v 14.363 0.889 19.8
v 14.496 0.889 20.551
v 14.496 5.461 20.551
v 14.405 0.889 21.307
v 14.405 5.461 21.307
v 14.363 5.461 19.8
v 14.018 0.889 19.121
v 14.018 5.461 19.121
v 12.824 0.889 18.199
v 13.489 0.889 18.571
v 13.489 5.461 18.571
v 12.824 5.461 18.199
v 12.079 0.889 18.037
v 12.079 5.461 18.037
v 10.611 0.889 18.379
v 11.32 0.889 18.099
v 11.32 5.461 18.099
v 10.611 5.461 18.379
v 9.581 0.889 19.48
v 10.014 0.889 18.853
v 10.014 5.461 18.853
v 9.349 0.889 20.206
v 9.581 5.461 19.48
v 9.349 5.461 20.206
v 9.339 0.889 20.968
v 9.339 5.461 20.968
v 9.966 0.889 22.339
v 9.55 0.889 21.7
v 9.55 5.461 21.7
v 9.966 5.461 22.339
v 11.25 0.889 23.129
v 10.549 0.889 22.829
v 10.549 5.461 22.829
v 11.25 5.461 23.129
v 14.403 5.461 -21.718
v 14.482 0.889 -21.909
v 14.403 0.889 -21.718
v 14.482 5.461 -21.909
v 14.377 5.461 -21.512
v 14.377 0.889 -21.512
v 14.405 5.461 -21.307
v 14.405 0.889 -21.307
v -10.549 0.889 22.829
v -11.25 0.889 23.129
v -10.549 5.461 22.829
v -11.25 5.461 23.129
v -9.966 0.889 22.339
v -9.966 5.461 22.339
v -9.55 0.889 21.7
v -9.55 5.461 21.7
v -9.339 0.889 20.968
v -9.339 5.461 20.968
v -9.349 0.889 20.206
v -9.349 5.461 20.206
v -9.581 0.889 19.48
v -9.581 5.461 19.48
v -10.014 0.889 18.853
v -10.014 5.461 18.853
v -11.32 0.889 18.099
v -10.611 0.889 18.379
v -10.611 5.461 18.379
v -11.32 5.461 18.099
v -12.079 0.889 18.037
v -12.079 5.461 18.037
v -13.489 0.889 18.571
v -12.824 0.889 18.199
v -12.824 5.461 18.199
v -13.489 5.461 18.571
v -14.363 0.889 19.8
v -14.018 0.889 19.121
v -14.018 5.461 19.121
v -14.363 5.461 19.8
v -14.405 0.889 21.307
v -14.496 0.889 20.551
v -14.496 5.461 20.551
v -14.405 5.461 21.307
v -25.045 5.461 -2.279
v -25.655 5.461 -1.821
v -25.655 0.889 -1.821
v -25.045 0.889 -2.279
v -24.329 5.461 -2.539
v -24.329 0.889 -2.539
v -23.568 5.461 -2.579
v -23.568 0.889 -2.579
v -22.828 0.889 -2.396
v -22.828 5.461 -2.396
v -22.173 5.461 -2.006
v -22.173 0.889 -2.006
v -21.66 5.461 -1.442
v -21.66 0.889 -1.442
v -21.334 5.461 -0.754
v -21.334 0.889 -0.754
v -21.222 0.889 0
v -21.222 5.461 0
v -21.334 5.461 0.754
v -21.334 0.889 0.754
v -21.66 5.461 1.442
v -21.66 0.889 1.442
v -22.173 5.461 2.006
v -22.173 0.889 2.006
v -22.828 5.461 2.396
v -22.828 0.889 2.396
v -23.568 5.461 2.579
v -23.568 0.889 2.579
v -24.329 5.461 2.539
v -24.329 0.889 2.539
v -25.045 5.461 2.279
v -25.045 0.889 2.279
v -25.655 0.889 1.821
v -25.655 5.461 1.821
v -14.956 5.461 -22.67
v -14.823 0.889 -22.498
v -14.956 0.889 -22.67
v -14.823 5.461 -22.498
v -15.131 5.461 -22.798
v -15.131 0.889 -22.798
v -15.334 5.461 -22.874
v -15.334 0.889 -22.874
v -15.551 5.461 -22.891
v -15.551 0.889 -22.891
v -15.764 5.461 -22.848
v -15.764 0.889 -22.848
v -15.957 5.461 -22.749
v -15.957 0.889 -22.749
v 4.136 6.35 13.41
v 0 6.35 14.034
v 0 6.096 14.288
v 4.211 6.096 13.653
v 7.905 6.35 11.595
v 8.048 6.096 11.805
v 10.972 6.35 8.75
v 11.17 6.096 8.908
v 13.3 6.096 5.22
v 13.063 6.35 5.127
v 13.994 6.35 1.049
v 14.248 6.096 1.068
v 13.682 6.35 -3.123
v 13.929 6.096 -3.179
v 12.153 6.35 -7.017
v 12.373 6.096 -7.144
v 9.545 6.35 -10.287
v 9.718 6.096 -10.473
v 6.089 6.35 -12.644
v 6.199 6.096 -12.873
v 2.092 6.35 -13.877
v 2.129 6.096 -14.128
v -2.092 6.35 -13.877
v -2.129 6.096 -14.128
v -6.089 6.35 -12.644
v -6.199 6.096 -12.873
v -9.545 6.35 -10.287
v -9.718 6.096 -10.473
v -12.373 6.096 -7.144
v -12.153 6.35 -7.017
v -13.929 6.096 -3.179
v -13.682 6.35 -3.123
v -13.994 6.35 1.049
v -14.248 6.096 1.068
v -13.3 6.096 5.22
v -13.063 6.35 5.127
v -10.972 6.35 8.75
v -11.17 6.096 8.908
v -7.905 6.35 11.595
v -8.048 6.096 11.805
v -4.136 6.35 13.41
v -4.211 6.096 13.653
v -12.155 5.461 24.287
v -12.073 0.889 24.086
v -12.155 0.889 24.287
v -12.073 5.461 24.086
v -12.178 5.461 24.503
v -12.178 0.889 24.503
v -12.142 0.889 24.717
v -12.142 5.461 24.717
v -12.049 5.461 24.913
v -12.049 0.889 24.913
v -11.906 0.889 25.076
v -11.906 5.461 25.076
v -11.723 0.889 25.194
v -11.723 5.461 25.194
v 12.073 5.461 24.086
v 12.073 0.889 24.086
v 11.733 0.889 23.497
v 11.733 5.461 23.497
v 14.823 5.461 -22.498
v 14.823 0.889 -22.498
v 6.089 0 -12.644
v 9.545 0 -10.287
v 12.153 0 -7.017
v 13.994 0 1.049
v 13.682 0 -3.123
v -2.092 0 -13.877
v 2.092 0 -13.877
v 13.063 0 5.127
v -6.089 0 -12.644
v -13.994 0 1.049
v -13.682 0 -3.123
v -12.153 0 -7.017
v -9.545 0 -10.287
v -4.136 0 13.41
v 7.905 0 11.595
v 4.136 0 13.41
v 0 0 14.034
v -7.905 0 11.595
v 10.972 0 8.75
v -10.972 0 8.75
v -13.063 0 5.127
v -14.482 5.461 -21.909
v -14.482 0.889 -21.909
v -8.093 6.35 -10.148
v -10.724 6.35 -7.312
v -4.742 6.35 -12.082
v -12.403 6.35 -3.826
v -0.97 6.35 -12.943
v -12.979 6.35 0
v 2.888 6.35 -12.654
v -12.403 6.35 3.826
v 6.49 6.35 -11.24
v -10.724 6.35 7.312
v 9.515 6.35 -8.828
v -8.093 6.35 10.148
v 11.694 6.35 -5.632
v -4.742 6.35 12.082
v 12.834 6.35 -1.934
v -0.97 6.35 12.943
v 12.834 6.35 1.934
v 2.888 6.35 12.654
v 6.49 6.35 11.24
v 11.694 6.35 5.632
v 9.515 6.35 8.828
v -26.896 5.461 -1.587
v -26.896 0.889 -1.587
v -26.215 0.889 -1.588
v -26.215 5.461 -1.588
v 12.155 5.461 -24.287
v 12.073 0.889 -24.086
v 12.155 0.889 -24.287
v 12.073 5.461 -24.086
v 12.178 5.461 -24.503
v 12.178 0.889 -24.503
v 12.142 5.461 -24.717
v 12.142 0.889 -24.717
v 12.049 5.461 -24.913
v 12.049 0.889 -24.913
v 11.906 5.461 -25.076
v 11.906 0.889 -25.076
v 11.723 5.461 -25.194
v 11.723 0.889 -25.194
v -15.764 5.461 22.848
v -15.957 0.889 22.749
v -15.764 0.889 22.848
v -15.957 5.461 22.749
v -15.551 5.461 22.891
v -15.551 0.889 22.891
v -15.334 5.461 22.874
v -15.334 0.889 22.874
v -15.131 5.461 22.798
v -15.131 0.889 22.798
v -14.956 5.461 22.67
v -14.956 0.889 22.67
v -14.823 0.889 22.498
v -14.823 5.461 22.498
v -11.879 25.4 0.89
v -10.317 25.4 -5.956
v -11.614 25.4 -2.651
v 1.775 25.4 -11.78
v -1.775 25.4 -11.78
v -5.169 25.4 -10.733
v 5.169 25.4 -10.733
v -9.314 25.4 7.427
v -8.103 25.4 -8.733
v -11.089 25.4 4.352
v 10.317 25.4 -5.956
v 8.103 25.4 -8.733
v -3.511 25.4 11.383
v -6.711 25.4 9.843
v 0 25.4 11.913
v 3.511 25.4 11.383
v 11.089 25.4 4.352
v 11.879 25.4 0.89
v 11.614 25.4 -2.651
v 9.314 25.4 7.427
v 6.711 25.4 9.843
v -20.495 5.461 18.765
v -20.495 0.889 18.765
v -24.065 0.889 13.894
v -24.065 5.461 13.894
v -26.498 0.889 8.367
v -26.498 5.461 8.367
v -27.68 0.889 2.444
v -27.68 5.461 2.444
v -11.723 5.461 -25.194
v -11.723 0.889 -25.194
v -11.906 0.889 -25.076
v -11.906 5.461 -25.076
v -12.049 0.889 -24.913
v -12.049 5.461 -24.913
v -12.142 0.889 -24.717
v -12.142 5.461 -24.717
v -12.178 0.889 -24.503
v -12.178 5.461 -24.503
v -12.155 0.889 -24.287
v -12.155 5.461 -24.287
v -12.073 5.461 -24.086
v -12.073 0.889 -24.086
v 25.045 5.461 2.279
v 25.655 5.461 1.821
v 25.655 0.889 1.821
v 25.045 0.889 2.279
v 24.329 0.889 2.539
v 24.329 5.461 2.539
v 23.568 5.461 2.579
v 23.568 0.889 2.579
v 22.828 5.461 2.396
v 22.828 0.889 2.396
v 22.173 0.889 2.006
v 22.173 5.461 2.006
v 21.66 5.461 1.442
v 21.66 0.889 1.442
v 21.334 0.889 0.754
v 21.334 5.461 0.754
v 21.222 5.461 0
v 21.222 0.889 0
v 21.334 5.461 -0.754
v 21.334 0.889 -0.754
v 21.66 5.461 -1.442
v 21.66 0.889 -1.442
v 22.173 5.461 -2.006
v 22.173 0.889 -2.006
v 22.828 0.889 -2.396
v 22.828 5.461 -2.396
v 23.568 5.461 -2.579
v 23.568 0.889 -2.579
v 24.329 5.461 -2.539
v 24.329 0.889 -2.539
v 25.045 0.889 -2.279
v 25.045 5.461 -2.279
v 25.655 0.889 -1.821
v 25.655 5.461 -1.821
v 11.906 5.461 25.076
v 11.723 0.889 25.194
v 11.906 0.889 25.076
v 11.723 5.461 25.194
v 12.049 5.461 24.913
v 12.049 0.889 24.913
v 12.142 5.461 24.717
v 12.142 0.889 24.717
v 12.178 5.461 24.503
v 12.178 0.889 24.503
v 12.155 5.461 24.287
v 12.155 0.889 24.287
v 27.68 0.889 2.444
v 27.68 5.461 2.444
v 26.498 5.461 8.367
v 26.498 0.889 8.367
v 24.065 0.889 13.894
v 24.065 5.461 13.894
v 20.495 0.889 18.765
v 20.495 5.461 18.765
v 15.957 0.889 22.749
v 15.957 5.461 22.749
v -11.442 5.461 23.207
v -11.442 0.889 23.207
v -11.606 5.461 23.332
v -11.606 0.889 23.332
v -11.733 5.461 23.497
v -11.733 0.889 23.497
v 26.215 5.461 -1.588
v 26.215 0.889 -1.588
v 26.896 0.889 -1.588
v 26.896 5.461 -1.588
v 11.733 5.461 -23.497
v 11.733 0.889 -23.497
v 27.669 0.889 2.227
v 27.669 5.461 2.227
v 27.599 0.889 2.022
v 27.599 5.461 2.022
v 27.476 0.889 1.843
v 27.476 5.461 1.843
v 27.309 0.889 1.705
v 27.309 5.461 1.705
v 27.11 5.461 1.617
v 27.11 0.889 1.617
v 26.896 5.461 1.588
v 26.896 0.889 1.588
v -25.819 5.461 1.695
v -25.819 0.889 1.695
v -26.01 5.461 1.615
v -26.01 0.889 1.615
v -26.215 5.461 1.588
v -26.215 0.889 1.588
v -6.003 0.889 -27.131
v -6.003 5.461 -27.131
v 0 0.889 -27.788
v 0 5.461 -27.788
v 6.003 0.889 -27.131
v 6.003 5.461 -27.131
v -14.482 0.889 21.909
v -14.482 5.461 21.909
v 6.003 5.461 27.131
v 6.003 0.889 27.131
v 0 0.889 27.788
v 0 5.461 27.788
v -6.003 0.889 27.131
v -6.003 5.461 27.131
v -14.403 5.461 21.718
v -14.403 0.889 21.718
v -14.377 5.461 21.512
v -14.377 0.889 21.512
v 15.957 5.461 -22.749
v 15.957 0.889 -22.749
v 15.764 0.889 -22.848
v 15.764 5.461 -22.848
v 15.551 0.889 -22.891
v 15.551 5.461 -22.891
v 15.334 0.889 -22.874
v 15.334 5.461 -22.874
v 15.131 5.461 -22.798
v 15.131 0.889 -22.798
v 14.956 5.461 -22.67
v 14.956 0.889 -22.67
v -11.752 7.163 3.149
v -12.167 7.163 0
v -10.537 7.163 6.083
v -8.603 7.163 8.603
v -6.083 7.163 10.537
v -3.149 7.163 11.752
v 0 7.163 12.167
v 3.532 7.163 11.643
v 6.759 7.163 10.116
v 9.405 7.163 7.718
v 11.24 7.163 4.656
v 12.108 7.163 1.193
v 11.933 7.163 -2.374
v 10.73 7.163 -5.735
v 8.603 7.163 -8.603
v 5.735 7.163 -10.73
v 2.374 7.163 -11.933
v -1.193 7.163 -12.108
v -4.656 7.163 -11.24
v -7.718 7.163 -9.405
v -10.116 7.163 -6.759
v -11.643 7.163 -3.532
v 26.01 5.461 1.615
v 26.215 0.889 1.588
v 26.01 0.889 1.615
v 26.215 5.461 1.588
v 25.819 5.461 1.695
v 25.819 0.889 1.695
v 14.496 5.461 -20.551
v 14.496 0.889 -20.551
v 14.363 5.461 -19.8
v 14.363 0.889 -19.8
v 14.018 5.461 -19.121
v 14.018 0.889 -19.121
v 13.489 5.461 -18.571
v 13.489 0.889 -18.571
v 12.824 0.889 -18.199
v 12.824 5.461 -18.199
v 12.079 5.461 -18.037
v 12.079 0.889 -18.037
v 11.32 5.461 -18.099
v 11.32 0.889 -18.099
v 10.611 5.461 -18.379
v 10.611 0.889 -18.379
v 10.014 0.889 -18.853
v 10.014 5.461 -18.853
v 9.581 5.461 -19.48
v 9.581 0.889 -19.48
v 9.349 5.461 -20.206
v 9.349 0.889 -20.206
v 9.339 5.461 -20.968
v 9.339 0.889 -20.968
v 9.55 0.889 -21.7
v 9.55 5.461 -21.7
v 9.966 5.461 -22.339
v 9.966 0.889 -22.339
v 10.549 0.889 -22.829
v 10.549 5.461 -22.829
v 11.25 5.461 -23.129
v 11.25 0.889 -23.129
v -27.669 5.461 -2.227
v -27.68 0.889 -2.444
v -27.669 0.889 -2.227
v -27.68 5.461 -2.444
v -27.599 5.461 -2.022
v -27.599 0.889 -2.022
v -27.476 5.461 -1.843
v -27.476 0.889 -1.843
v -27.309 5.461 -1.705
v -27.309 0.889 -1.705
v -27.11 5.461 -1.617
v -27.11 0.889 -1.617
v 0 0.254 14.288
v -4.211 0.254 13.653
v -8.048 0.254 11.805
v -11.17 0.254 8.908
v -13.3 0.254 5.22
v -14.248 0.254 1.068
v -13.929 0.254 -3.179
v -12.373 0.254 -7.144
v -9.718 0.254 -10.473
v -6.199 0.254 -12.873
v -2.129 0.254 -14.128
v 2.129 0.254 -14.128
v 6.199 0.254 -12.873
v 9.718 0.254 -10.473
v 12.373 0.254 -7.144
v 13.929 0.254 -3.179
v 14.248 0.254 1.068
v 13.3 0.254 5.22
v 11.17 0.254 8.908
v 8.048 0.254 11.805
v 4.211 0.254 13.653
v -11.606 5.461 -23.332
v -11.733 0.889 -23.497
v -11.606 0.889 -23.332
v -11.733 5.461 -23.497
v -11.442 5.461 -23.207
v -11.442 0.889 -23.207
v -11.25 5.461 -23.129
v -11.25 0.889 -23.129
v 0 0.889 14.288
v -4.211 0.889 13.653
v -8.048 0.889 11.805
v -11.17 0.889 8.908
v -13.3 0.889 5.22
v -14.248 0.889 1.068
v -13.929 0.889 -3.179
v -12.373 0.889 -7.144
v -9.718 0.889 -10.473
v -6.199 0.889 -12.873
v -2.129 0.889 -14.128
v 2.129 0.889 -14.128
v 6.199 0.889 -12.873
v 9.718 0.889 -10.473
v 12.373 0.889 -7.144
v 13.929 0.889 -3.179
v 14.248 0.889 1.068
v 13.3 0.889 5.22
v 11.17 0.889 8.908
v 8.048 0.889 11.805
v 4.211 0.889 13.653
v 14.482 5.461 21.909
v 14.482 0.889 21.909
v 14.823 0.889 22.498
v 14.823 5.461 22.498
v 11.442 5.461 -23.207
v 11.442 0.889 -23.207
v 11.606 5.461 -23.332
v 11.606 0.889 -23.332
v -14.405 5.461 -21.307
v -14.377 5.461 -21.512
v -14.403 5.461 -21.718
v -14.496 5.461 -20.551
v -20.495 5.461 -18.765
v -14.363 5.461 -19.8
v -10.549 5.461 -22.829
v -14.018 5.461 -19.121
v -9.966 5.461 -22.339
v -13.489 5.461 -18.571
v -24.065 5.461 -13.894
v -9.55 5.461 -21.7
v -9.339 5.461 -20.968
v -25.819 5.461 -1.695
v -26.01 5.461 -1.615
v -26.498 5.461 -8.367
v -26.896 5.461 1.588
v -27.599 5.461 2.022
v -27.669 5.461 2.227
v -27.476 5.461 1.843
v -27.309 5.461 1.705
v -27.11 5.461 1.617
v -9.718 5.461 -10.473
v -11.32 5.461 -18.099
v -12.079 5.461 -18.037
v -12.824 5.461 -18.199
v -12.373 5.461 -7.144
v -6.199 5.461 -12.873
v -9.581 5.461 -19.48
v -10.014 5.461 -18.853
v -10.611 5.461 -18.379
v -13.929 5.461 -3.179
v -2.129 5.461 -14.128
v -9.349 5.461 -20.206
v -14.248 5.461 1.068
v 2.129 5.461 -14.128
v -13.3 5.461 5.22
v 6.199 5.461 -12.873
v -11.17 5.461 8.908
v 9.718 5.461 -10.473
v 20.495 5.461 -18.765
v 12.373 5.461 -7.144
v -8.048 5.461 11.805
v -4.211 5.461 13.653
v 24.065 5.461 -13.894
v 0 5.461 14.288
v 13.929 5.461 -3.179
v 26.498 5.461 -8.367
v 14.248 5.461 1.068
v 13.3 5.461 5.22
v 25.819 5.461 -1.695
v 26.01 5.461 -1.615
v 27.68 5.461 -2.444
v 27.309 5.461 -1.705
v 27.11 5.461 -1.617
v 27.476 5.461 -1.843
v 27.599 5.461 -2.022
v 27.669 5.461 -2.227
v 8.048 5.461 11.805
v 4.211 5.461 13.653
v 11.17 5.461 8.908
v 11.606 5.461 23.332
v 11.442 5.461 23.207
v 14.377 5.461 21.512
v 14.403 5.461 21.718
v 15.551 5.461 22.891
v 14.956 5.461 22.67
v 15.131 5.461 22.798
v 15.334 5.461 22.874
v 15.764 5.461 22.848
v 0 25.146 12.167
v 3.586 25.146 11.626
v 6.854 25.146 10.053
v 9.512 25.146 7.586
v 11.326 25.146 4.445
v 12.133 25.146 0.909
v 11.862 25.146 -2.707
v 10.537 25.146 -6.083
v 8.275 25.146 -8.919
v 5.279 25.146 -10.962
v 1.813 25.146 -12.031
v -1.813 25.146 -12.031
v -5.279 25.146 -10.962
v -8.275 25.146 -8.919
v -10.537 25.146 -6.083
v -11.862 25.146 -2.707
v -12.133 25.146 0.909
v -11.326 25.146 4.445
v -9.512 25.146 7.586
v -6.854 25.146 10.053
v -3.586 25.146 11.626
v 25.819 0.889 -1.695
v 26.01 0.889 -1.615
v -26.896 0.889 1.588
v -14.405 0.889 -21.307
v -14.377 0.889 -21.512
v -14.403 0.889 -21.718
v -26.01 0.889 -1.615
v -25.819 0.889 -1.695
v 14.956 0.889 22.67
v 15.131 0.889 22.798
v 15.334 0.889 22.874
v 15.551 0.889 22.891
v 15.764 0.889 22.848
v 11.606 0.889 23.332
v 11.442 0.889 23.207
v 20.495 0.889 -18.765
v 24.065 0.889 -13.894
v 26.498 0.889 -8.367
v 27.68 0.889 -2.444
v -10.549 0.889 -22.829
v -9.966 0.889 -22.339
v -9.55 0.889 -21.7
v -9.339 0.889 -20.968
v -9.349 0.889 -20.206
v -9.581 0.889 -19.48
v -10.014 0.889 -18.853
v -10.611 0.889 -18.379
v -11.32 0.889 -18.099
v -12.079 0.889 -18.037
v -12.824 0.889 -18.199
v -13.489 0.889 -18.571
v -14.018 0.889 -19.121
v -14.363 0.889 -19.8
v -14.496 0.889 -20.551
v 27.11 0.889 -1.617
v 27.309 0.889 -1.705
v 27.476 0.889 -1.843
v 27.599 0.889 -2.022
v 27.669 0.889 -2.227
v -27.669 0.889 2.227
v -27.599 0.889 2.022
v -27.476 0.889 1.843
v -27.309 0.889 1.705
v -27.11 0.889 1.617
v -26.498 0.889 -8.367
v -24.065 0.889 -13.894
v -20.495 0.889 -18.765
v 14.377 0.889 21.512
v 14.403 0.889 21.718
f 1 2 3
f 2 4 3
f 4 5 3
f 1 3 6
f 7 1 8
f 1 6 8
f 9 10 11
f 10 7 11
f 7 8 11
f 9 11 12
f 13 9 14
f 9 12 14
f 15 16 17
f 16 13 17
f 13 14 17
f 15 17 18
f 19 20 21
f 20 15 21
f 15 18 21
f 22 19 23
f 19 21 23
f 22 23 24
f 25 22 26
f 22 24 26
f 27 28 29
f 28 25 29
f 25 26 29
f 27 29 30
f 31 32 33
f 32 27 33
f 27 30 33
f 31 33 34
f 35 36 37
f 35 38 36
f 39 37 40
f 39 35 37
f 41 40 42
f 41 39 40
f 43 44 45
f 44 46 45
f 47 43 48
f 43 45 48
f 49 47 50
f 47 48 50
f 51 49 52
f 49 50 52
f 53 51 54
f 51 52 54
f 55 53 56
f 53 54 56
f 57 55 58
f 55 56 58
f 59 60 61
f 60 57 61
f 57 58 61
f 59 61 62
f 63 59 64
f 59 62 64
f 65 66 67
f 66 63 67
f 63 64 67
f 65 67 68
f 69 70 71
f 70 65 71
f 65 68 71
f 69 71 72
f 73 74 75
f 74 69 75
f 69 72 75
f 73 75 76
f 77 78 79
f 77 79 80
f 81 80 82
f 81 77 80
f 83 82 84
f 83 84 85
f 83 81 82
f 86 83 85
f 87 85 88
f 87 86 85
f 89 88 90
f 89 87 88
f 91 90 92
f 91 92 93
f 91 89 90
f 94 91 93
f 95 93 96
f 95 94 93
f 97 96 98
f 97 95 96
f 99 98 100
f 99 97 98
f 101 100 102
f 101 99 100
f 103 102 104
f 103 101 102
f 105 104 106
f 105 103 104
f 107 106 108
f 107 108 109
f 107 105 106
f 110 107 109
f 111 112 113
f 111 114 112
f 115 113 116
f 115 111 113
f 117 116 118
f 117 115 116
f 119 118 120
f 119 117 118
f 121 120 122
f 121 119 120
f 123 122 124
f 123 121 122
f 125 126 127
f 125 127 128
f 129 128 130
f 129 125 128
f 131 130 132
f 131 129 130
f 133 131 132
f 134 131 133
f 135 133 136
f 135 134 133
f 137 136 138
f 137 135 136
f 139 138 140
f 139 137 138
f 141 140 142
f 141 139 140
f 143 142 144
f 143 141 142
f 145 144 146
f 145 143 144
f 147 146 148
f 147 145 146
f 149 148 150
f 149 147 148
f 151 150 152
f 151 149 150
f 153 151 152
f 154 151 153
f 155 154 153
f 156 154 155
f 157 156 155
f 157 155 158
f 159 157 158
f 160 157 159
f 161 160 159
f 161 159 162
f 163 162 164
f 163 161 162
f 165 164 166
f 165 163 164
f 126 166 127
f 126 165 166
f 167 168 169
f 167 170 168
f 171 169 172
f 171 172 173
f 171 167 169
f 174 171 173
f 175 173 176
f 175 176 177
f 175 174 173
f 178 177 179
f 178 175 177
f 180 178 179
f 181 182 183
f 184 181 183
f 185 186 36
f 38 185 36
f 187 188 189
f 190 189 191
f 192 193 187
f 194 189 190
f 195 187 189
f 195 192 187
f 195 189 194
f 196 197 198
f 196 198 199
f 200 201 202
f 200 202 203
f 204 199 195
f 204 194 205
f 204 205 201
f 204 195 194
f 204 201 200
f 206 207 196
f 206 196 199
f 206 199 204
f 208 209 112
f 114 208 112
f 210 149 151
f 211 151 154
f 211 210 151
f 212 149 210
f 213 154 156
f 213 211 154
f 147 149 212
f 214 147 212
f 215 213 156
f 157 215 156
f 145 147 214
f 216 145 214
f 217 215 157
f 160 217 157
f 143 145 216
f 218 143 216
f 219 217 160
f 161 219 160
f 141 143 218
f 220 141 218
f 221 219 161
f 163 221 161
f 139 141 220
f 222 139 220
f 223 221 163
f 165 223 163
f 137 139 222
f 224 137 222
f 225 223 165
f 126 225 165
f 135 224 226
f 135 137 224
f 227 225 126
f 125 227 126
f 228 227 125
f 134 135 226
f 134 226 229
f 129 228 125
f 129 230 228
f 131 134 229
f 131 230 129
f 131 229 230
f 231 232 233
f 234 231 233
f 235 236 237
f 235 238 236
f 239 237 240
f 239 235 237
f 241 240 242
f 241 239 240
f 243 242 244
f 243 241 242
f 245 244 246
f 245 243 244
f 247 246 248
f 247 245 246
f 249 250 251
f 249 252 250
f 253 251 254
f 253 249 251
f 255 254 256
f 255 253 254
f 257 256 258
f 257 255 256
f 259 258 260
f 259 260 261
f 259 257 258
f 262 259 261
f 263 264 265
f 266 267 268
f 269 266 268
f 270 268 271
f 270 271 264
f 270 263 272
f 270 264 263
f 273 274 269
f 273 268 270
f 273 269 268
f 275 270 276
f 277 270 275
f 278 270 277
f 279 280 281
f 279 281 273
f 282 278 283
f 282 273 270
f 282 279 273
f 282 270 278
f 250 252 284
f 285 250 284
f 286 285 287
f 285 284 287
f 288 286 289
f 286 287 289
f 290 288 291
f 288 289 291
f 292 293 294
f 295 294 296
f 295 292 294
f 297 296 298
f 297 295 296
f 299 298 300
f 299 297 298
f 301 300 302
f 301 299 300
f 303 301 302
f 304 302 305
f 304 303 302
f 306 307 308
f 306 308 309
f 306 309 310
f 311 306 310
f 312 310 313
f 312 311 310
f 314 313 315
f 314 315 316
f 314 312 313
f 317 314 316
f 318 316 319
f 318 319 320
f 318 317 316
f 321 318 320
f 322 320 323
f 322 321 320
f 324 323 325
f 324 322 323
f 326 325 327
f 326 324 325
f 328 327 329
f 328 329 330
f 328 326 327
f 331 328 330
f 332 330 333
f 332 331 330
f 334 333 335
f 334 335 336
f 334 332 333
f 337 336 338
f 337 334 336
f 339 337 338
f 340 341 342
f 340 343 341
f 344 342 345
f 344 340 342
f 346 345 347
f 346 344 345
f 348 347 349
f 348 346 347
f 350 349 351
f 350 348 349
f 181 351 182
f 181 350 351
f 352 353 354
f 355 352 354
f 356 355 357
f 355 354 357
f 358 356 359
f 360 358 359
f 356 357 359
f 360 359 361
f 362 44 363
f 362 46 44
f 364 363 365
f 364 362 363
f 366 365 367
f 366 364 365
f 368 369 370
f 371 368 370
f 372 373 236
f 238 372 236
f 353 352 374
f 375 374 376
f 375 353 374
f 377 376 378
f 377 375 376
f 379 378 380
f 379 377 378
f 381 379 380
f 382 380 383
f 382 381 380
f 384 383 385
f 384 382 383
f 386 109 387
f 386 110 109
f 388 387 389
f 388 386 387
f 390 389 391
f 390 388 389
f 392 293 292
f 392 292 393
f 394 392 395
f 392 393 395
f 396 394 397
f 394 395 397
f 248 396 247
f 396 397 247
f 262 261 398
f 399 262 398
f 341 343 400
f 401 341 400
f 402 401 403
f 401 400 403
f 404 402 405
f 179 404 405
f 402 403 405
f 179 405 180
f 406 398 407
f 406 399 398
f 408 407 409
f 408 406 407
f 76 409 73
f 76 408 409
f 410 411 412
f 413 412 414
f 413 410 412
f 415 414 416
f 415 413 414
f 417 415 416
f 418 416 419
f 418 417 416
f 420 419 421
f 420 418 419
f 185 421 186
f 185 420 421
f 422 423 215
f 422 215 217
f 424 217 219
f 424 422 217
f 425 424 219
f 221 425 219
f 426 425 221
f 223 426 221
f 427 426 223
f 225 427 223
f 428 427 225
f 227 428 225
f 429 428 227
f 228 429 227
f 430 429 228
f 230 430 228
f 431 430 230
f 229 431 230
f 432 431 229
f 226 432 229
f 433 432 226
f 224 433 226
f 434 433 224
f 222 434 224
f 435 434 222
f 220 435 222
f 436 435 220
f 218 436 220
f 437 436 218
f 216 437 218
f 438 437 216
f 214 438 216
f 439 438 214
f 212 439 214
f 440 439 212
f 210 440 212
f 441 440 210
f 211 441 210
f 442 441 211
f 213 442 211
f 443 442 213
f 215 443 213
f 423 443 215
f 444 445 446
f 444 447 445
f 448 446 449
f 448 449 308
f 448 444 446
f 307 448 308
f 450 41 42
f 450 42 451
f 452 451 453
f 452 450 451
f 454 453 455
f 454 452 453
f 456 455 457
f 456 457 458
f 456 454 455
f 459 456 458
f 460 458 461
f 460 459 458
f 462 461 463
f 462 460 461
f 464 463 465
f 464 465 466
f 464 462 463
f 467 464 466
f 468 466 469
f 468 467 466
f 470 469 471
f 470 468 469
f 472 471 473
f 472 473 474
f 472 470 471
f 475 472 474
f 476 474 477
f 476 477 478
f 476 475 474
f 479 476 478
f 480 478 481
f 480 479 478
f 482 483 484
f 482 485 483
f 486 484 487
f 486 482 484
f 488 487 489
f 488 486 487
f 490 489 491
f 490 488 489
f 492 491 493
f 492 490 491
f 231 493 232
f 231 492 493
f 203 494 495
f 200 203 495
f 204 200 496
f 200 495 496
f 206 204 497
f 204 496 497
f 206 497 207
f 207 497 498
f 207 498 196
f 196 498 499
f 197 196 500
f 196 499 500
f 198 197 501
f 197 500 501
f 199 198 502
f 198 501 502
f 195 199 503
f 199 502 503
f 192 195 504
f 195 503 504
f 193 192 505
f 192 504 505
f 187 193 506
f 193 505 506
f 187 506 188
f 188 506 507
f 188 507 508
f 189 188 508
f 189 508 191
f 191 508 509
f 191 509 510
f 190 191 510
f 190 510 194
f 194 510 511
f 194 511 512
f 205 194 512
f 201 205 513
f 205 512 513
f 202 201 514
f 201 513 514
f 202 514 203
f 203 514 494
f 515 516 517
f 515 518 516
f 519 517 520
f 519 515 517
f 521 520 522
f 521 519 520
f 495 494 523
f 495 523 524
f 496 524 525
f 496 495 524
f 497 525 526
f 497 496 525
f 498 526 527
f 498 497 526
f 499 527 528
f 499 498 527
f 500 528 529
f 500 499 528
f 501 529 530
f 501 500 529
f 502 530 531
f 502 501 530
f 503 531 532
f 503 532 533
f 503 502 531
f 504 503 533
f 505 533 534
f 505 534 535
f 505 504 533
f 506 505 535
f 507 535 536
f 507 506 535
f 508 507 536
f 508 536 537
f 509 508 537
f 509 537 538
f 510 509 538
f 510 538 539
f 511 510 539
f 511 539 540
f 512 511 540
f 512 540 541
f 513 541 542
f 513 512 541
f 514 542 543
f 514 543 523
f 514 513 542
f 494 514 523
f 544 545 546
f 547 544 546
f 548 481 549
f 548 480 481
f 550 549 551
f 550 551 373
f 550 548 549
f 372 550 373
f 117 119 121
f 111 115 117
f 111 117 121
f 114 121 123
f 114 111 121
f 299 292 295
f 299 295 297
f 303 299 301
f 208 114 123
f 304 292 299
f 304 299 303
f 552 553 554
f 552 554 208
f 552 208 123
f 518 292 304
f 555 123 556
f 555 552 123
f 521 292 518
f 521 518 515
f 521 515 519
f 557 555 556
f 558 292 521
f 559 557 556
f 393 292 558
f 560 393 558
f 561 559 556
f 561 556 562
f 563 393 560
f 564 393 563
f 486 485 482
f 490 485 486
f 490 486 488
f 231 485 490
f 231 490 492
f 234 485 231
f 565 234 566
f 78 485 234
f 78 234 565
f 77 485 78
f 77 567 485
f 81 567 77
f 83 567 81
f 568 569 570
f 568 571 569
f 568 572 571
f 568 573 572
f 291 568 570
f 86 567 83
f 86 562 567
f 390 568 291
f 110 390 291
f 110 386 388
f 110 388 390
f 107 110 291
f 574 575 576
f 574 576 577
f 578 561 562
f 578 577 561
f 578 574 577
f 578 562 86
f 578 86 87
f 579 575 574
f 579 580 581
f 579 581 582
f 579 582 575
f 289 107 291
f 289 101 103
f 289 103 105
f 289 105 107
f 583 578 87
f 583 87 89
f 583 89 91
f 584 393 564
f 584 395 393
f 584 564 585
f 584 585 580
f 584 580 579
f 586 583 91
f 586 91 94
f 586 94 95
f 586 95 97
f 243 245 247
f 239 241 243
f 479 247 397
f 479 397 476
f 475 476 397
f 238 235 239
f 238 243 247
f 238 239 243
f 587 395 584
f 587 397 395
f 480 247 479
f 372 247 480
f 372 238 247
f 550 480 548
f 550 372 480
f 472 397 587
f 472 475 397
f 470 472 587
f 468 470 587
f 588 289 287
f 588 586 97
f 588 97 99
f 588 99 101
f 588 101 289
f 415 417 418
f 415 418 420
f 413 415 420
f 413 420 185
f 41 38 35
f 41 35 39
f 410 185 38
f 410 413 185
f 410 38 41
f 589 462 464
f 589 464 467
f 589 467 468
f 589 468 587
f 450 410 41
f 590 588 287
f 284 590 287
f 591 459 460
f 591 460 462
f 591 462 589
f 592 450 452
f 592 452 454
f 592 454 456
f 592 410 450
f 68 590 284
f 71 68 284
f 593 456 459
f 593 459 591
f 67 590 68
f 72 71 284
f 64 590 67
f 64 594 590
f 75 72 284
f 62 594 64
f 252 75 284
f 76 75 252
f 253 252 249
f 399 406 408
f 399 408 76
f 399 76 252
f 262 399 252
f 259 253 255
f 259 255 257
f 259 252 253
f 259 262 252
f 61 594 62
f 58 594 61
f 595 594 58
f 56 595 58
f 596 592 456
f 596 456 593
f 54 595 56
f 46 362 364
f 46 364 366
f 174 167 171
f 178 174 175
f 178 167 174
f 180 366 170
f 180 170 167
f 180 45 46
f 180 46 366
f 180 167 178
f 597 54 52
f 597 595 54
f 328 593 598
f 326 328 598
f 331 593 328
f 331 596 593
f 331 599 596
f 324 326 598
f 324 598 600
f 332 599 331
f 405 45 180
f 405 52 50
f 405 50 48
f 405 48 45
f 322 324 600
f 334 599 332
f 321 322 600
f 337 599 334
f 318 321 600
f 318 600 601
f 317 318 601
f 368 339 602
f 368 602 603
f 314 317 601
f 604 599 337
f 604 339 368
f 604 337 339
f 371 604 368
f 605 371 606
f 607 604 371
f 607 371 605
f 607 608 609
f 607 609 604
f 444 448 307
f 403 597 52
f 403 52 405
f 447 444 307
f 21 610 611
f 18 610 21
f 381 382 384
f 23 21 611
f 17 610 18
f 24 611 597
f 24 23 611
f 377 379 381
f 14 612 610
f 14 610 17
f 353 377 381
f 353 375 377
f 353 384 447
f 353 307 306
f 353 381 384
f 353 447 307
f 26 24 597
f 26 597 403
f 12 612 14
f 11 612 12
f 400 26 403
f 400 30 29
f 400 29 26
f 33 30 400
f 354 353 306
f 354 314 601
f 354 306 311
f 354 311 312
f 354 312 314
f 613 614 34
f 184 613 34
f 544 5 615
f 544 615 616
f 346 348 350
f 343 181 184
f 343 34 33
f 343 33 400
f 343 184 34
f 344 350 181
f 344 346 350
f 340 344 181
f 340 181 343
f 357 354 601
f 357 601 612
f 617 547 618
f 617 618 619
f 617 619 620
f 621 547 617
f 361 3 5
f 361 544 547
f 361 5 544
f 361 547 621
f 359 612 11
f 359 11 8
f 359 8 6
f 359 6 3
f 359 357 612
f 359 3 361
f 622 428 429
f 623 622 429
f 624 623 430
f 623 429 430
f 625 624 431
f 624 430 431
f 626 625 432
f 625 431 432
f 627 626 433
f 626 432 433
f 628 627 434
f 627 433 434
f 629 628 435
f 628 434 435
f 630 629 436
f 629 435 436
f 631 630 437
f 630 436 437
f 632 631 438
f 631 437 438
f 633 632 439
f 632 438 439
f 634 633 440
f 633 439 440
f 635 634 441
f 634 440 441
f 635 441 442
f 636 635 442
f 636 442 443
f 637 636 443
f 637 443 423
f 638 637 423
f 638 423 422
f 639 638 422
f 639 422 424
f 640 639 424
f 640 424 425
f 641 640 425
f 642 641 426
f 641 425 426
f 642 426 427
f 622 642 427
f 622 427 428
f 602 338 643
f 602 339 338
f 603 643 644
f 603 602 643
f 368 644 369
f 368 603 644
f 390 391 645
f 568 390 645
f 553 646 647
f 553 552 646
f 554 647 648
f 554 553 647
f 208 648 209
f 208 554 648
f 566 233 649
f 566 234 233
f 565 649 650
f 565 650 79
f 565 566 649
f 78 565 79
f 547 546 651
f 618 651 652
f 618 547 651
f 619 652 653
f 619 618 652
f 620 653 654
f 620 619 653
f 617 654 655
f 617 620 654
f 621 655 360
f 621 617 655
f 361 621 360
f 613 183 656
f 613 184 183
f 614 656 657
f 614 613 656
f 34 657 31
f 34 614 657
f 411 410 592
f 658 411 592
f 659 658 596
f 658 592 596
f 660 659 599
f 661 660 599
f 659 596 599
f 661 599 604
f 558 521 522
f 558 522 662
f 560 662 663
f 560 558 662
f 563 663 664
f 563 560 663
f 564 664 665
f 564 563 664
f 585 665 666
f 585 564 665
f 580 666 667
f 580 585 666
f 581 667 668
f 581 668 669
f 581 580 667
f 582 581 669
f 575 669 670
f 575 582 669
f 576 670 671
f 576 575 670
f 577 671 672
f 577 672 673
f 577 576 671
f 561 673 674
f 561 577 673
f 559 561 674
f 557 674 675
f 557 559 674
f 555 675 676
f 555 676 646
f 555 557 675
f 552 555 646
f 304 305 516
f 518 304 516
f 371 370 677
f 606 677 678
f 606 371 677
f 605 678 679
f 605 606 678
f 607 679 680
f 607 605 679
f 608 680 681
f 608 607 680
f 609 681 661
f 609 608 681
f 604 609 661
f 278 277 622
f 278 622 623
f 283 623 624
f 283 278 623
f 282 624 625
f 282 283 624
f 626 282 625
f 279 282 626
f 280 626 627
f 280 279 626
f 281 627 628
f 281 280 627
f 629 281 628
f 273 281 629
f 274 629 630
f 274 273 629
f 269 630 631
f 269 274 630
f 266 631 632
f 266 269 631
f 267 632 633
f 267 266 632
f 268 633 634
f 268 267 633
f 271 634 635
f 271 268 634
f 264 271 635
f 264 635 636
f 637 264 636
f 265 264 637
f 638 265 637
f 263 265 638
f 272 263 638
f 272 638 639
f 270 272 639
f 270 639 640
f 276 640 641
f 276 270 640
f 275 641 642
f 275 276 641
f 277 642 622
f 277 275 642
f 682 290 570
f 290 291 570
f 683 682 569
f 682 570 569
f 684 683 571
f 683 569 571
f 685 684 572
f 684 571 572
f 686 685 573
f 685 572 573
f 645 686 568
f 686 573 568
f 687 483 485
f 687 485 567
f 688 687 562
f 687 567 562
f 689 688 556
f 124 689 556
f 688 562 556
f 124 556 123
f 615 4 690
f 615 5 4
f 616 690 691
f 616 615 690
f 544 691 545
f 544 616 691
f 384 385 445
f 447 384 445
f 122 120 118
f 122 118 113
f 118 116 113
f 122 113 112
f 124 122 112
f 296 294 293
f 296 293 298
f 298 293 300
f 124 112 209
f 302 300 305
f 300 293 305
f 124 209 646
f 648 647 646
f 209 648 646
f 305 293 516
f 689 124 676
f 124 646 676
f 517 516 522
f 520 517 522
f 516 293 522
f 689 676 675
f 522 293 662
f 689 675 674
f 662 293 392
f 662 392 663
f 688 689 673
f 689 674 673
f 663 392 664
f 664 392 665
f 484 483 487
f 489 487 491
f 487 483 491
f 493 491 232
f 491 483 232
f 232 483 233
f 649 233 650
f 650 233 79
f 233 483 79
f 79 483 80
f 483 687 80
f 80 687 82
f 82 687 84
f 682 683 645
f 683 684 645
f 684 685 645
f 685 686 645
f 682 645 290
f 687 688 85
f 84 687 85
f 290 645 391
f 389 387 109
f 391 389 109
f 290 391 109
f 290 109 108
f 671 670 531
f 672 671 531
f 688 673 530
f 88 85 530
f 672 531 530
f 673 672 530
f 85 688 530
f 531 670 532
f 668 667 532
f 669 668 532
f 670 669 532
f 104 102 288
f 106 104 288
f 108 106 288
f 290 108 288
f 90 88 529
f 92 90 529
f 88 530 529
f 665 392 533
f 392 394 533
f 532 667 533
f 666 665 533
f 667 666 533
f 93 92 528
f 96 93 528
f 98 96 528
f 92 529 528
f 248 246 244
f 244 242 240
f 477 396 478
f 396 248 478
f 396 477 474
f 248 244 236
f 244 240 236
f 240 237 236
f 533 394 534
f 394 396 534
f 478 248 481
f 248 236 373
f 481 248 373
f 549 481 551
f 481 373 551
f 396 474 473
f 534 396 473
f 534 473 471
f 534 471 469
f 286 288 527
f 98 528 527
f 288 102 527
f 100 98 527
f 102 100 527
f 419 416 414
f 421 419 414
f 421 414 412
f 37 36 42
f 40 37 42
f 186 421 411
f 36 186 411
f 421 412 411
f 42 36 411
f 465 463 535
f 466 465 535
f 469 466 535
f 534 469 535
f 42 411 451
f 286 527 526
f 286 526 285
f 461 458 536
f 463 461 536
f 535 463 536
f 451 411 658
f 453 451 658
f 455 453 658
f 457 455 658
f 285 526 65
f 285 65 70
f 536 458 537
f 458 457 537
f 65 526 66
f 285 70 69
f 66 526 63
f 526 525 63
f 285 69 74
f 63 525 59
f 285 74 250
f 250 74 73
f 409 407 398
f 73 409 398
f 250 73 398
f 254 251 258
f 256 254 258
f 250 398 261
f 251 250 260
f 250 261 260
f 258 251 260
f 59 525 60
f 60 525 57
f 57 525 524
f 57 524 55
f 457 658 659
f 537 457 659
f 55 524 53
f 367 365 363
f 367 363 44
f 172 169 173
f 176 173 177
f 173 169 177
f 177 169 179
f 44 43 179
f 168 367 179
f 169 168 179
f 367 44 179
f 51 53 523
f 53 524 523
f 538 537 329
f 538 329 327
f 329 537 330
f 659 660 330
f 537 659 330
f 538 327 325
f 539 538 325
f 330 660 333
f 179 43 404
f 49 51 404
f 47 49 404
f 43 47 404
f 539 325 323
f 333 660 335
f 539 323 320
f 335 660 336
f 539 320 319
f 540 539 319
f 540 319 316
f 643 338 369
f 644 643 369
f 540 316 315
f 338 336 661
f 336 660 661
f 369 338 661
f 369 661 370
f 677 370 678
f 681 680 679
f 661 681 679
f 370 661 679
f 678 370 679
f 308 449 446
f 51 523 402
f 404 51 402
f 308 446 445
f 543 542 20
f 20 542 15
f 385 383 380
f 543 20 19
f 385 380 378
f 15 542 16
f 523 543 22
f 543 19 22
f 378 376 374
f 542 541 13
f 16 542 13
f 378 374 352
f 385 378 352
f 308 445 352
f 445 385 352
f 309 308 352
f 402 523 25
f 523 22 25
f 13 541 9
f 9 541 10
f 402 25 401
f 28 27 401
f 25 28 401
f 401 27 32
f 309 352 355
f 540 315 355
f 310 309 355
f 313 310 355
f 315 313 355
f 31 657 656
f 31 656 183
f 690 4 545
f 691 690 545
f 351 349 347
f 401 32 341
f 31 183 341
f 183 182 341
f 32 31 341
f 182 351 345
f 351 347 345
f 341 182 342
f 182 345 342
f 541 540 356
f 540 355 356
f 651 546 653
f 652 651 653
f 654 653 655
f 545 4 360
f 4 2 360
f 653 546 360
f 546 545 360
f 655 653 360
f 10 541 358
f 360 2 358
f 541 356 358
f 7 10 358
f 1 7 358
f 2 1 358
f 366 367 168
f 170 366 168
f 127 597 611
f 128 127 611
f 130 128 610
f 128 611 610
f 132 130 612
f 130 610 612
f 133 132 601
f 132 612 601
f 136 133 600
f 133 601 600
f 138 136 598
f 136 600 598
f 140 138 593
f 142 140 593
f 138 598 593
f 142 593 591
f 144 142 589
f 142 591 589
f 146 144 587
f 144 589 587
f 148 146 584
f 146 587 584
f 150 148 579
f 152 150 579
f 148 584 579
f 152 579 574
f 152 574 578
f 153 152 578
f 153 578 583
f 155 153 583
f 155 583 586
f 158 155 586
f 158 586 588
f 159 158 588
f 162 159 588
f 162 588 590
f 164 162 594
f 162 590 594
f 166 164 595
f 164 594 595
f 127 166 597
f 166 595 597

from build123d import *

# Parameters (mm, degrees)
SKETCH1_W           = 27.7876
SKETCH1_H           = 4.572
CUT_EXTRUDE1_DEPTH  = 40.562666891
CUT_EXTRUDE2_DEPTH  = 40.562666891
CUT_EXTRUDE3_DEPTH  = 40.562666891
CUT_EXTRUDE4_DEPTH  = 40.562666891
CUT_EXTRUDE5_DEPTH  = 40.530803878
CUT_EXTRUDE6_DEPTH  = 40.530803878
SKETCH8_R           = 14.2875
BOSS_EXTRUDE1_DEPTH = 0.889
SKETCH9_R           = 12.9794
BOSS_EXTRUDE2_DEPTH = 0.8128
BOSS_EXTRUDE2_TAPER = 45
SKETCH10_R          = 12.1666
BOSS_EXTRUDE3_DEPTH = 18.2372
BOSS_EXTRUDE4_START = 0.889
SKETCH11_R          = 14.2875
BOSS_EXTRUDE4_DEPTH = 0.889
CUT_EXTRUDE7_DEPTH  = 47.764743892
SKETCH13_W          = 2.5908
SKETCH13_H          = 4.572
SKETCH14_W          = 2.5908
SKETCH14_H          = 4.572
SKETCH15_W          = 2.5908
SKETCH15_H          = 4.572
SKETCH16_W          = 2.5908
SKETCH16_H          = 4.572
SKETCH17_W          = 2.5908
SKETCH17_H          = 4.572
SKETCH18_W          = 2.5908
SKETCH18_H          = 4.572
CHAMFER1_SIZE       = 0.254
FILLET1_R           = 0.127
FILLET2_R           = 0.7874
SKETCH19_R          = 9.350419414
BOSS_EXTRUDE7_DEPTH = 25.4


with BuildPart() as part:
    # Sketch1 → Revolve1 (revolve)
    with BuildSketch(Plane.XY, mode=Mode.PRIVATE) as revolve1_sk:
        with Locations((13.8938, 3.175)):
            Rectangle(SKETCH1_W, SKETCH1_H)
    revolve(revolve1_sk.sketch.rotate(Axis((0, 5.461, 0), (0, -1, 0)), 270), axis=Axis((0, 5.461, 0), (0, -1, 0)))

    # Sketch2 → Cut-Extrude1 (cut, through all)
    with BuildSketch(Plane.XZ.offset(-0.889)):
        with BuildLine():
            Line((-27.742216161, -1.5875), (-25.859959008, -1.5875))
            ThreePointArc((-25.859959008, -1.5875), (-26.4033, 0), (-25.859959008, 1.5875))
            Line((-25.859959008, 1.5875), (-27.742216161, 1.5875))
            ThreePointArc((-27.742216161, 1.5875), (-27.7876, 0), (-27.742216161, -1.5875))
        make_face()
    extrude(amount=-CUT_EXTRUDE1_DEPTH, mode=Mode.SUBTRACT)

    # Sketch3 → Cut-Extrude2 (cut, through all)
    with BuildSketch(Plane.XZ.offset(-0.889)):
        with BuildLine():
            Line((-15.245923409, 23.231713952), (-14.304794833, 21.601631442))
            ThreePointArc((-14.304794833, 21.601631442), (-13.20165, 22.865928544), (-11.555164176, 23.189131442))
            Line((-11.555164176, 23.189131442), (-12.496292752, 24.819213952))
            ThreePointArc((-12.496292752, 24.819213952), (-13.8938, 24.06476751), (-15.245923409, 23.231713952))
        make_face()
    extrude(amount=-CUT_EXTRUDE2_DEPTH, mode=Mode.SUBTRACT)

    # Sketch4 → Cut-Extrude3 (cut, through all)
    with BuildSketch(Plane.XZ.offset(-0.889)):
        with BuildLine():
            Line((12.496292752, 24.819213952), (11.555164176, 23.189131442))
            ThreePointArc((11.555164176, 23.189131442), (13.20165, 22.865928544), (14.304794833, 21.601631442))
            Line((14.304794833, 21.601631442), (15.245923409, 23.231713952))
            ThreePointArc((15.245923409, 23.231713952), (13.8938, 24.06476751), (12.496292752, 24.819213952))
        make_face()
    extrude(amount=-CUT_EXTRUDE3_DEPTH, mode=Mode.SUBTRACT)

    # Sketch5 → Cut-Extrude4 (cut, through all)
    with BuildSketch(Plane.XZ.offset(-0.889)):
        with BuildLine():
            Line((27.742216161, 1.5875), (25.859959008, 1.5875))
            ThreePointArc((25.859959008, 1.5875), (26.4033, 0), (25.859959008, -1.5875))
            Line((25.859959008, -1.5875), (27.742216161, -1.5875))
            ThreePointArc((27.742216161, -1.5875), (27.7876, 0), (27.742216161, 1.5875))
        make_face()
    extrude(amount=-CUT_EXTRUDE4_DEPTH, mode=Mode.SUBTRACT)

    # Sketch6 → Cut-Extrude5 (cut, through all)
    with BuildSketch(Plane.XZ.offset(-0.889)):
        with BuildLine():
            Line((15.245923409, -23.231713952), (14.304794833, -21.601631442))
            ThreePointArc((14.304794833, -21.601631442), (13.20165, -22.865928544), (11.555164176, -23.189131442))
            Line((11.555164176, -23.189131442), (12.496292752, -24.819213952))
            ThreePointArc((12.496292752, -24.819213952), (13.8938, -24.06476751), (15.245923409, -23.231713952))
        make_face()
    extrude(amount=-CUT_EXTRUDE5_DEPTH, mode=Mode.SUBTRACT)

    # Sketch7 → Cut-Extrude6 (cut, through all)
    with BuildSketch(Plane.XZ.offset(-0.889)):
        with BuildLine():
            Line((-12.496292752, -24.819213952), (-11.555164176, -23.189131442))
            ThreePointArc((-11.555164176, -23.189131442), (-13.20165, -22.865928544), (-14.304794833, -21.601631442))
            Line((-14.304794833, -21.601631442), (-15.245923409, -23.231713952))
            ThreePointArc((-15.245923409, -23.231713952), (-13.8938, -24.06476751), (-12.496292752, -24.819213952))
        make_face()
    extrude(amount=-CUT_EXTRUDE6_DEPTH, mode=Mode.SUBTRACT)

    # Sketch8 → Boss-Extrude1 (add)
    with BuildSketch(Plane(origin=(0, 5.461, 0), x_dir=(-1, 0, 0), z_dir=(0, 1, 0))):
        with Locations(Location((0, 0, 0), (0, 0, 90))):
            Circle(SKETCH8_R)
    extrude(amount=BOSS_EXTRUDE1_DEPTH)

    # Sketch9 → Boss-Extrude2 (add)
    with BuildSketch(Plane(origin=(0, 6.35, 0), x_dir=(-1, 0, 0), z_dir=(0, 1, 0))):
        Circle(SKETCH9_R)
    extrude(amount=BOSS_EXTRUDE2_DEPTH, taper=BOSS_EXTRUDE2_TAPER)

    # Sketch10 → Boss-Extrude3 (add)
    with BuildSketch(Plane(origin=(0, 7.1628, 0), x_dir=(-1, 0, 0), z_dir=(0, 1, 0))):
        with Locations(Location((0, 0, 0), (0, 0, 90))):
            Circle(SKETCH10_R)
    extrude(amount=BOSS_EXTRUDE3_DEPTH)

    # Sketch11 → Boss-Extrude4 (add)
    with BuildSketch(Plane.XZ.offset(-0.889).offset(BOSS_EXTRUDE4_START)):
        with Locations(Location((0, 0, 0), (0, 0, 90))):
            Circle(SKETCH11_R)
    extrude(amount=-BOSS_EXTRUDE4_DEPTH)

    # Sketch12 → Cut-Extrude7 (cut, through all)
    with BuildSketch(Plane.XZ):
        with BuildLine():
            Line((-8.0518, -1.65735), (-6.248228986, -1.65735))
            ThreePointArc((-6.248228986, -1.65735), (0, -6.4643), (6.248228986, -1.65735))
            Line((6.248228986, -1.65735), (8.0518, -1.65735))
            Line((8.0518, -1.65735), (8.0518, 1.65735))
            Line((8.0518, 1.65735), (6.248228986, 1.65735))
            ThreePointArc((6.248228986, 1.65735), (0, 6.4643), (-6.248228986, 1.65735))
            Line((-6.248228986, 1.65735), (-8.0518, 1.65735))
            Line((-8.0518, 1.65735), (-8.0518, -1.65735))
        make_face()
    extrude(amount=-CUT_EXTRUDE7_DEPTH, mode=Mode.SUBTRACT)

    # Sketch13 → Cut-Revolve1 (revolve, cut)
    with BuildSketch(Plane.XY):
        with Locations((-22.5171, 3.175)):
            Rectangle(SKETCH13_W, SKETCH13_H)
    revolve(axis=Axis((-23.8125, 5.461, 0), (0, -1, 0)), mode=Mode.SUBTRACT)

    # Sketch14 → Cut-Revolve2 (revolve, cut)
    with BuildSketch(Plane(origin=(0, 0, 20.622229928), x_dir=(-1, 0, 0), z_dir=(0, 0, -1))):
        with Locations((10.61085, 3.175)):
            Rectangle(SKETCH14_W, SKETCH14_H)
    revolve(axis=Axis((-11.90625, 0.889, 20.622229928), (0, 1, 0)), mode=Mode.SUBTRACT)

    # Sketch15 → Cut-Revolve3 (revolve, cut)
    with BuildSketch(Plane(origin=(0, 0, 20.622229928), x_dir=(-1, 0, 0), z_dir=(0, 0, -1))):
        with Locations((-13.20165, 3.175)):
            Rectangle(SKETCH15_W, SKETCH15_H)
    revolve(axis=Axis((11.90625, 0.889, 20.622229928), (0, 1, 0)), mode=Mode.SUBTRACT)

    # Sketch16 → Cut-Revolve4 (revolve, cut)
    with BuildSketch(Plane.XY):
        with Locations((25.1079, 3.175)):
            Rectangle(SKETCH16_W, SKETCH16_H)
    revolve(axis=Axis((23.8125, 5.461, 0), (0, -1, 0)), mode=Mode.SUBTRACT)

    # Sketch17 → Cut-Revolve5 (revolve, cut)
    with BuildSketch(Plane.XY.offset(-20.622229928)):
        with Locations((13.20165, 3.175)):
            Rectangle(SKETCH17_W, SKETCH17_H)
    revolve(axis=Axis((11.90625, 5.461, -20.622229928), (0, -1, 0)), mode=Mode.SUBTRACT)

    # Sketch18 → Cut-Revolve6 (revolve, cut)
    with BuildSketch(Plane.XY.offset(-20.622229928)):
        with Locations((-10.61085, 3.175)):
            Rectangle(SKETCH18_W, SKETCH18_H)
    revolve(axis=Axis((-11.90625, 5.461, -20.622229928), (0, -1, 0)), mode=Mode.SUBTRACT)

    # Chamfer1
    chamfer1_edges = [part.edges().sort_by_distance(p)[0] for p in [
        (0, 6.35, -14.2875),
        (0, 25.4, -12.1666),
        (0, 0, -14.2875),
        (0, 25.4, 6.4643),
        (0, 25.4, -6.4643),
        (0, 0, -6.4643),
        (0, 0, 6.4643),
    ]]
    chamfer(chamfer1_edges, length=CHAMFER1_SIZE)

    # Fillet1
    fillet1_edges = [part.edges().sort_by_distance(p)[0] for p in [
        (-6.248228986, 12.7, 1.65735),
        (-8.0518, 12.7, 1.65735),
        (-8.0518, 12.7, -1.65735),
        (6.248228986, 12.7, 1.65735),
        (-6.248228986, 12.7, -1.65735),
        (8.0518, 12.7, 1.65735),
        (8.0518, 12.7, -1.65735),
        (6.248228986, 12.7, -1.65735),
    ]]
    fillet(fillet1_edges, radius=FILLET1_R)

    # Fillet2
    fillet2_edges = [part.edges().sort_by_distance(p)[0] for p in [
        (-27.742216161, 3.175, -1.5875),
        (-27.742216161, 3.175, 1.5875),
        (-25.859959008, 3.175, 1.5875),
        (-25.859959008, 3.175, -1.5875),
        (-15.245923409, 3.175, 23.231713952),
        (-12.496292752, 3.175, 24.819213952),
        (-11.555164176, 3.175, 23.189131442),
        (-14.304794833, 3.175, 21.601631442),
        (12.496292752, 3.175, 24.819213952),
        (15.245923409, 3.175, 23.231713952),
        (14.304794833, 3.175, 21.601631442),
        (11.555164176, 3.175, 23.189131442),
        (27.742216161, 3.175, 1.5875),
        (27.742216161, 3.175, -1.5875),
        (25.859959008, 3.175, -1.5875),
        (25.859959008, 3.175, 1.5875),
        (15.245923409, 3.175, -23.231713952),
        (12.496292752, 3.175, -24.819213952),
        (11.555164176, 3.175, -23.189131442),
        (14.304794833, 3.175, -21.601631442),
        (-12.496292752, 3.175, -24.819213952),
        (-15.245923409, 3.175, -23.231713952),
        (-14.304794833, 3.175, -21.601631442),
        (-11.555164176, 3.175, -23.189131442),
    ]]
    fillet(fillet2_edges, radius=FILLET2_R)

    # Sketch19 → Boss-Extrude7 (add)
    with BuildSketch(Plane(origin=(0, 25.4, 0), x_dir=(1, 0, 0), z_dir=(0, 1, 0))):
        Circle(SKETCH19_R)
    extrude(amount=-BOSS_EXTRUDE7_DEPTH)


solid = part.part
